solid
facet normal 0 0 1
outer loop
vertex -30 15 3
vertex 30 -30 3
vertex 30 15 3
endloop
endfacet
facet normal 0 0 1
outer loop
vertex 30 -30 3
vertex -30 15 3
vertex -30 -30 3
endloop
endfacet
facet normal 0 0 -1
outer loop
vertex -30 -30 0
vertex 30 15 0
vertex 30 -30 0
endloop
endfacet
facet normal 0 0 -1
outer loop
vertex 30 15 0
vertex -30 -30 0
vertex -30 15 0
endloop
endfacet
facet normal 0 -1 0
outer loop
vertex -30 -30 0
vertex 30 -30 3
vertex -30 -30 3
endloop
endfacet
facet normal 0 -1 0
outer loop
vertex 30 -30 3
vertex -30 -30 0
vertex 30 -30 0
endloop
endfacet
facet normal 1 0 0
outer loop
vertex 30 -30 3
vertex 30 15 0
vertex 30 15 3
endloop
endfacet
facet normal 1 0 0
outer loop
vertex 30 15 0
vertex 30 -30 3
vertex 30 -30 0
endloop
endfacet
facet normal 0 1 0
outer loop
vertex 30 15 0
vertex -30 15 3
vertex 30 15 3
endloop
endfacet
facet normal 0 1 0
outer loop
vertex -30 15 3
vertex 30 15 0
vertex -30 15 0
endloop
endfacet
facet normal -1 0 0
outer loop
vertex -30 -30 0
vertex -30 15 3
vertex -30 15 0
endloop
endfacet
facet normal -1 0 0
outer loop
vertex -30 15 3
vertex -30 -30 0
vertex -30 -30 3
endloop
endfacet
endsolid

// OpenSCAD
// Plate parameters
plate_width = 60;
plate_height = 45;
plate_thickness = 3;

// Design parameters
design_filename = "Sample inputs/flourish-60x45.dxf";
design_thickness = 1.5;

// Call the name of the module you want to run
// (choose from relief(), intaglio() and stencil()
relief();

/*************************************************
 Generate an embossing plate
 - Extrudes your design and places it on top of a flat plate
**************************************************/
module relief() {
	translate([-plate_width/2, -plate_width/2, 0]) {
		// Create the plate under the design
		cube(size = [plate_width, plate_height, plate_thickness]);
	
		// Place the design on top of the plate
		translate([0,0,plate_thickness])
			linear_extrude(height = design_thickness)
				offset(delta=0.001)
					import(design_filename);
	}
}

/**************************************************
 Generate a debossing plate
 - Subtracts your design into the top of a single plate
***************************************************/
module intaglio() {
	translate([-plate_width/2, -plate_width/2, 0]) {
		difference() {
			// Create the plate under the design
			cube(size = [plate_width, plate_height, plate_thickness]);
	
			// Subtract the design from the top of the plate
			translate([0, 0, plate_thickness - design_thickness])
				linear_extrude(height = design_thickness)
					offset(delta=0.001)
						import(design_filename);
		}
	}
}

/***************************************************
 Generate a stencil
 - Cuts your design all the way through a plate
****************************************************/
module stencil() {
	translate([-plate_width/2, -plate_width/2, 0]) {
		difference() {
			// Create the plate under the design
			cube(size = [plate_width, plate_height, plate_thickness]);
	
			// Subtract the design from the plate
			linear_extrude(height = plate_thickness)
				offset(delta=0.001)
					import(design_filename);
		}
	}
}
